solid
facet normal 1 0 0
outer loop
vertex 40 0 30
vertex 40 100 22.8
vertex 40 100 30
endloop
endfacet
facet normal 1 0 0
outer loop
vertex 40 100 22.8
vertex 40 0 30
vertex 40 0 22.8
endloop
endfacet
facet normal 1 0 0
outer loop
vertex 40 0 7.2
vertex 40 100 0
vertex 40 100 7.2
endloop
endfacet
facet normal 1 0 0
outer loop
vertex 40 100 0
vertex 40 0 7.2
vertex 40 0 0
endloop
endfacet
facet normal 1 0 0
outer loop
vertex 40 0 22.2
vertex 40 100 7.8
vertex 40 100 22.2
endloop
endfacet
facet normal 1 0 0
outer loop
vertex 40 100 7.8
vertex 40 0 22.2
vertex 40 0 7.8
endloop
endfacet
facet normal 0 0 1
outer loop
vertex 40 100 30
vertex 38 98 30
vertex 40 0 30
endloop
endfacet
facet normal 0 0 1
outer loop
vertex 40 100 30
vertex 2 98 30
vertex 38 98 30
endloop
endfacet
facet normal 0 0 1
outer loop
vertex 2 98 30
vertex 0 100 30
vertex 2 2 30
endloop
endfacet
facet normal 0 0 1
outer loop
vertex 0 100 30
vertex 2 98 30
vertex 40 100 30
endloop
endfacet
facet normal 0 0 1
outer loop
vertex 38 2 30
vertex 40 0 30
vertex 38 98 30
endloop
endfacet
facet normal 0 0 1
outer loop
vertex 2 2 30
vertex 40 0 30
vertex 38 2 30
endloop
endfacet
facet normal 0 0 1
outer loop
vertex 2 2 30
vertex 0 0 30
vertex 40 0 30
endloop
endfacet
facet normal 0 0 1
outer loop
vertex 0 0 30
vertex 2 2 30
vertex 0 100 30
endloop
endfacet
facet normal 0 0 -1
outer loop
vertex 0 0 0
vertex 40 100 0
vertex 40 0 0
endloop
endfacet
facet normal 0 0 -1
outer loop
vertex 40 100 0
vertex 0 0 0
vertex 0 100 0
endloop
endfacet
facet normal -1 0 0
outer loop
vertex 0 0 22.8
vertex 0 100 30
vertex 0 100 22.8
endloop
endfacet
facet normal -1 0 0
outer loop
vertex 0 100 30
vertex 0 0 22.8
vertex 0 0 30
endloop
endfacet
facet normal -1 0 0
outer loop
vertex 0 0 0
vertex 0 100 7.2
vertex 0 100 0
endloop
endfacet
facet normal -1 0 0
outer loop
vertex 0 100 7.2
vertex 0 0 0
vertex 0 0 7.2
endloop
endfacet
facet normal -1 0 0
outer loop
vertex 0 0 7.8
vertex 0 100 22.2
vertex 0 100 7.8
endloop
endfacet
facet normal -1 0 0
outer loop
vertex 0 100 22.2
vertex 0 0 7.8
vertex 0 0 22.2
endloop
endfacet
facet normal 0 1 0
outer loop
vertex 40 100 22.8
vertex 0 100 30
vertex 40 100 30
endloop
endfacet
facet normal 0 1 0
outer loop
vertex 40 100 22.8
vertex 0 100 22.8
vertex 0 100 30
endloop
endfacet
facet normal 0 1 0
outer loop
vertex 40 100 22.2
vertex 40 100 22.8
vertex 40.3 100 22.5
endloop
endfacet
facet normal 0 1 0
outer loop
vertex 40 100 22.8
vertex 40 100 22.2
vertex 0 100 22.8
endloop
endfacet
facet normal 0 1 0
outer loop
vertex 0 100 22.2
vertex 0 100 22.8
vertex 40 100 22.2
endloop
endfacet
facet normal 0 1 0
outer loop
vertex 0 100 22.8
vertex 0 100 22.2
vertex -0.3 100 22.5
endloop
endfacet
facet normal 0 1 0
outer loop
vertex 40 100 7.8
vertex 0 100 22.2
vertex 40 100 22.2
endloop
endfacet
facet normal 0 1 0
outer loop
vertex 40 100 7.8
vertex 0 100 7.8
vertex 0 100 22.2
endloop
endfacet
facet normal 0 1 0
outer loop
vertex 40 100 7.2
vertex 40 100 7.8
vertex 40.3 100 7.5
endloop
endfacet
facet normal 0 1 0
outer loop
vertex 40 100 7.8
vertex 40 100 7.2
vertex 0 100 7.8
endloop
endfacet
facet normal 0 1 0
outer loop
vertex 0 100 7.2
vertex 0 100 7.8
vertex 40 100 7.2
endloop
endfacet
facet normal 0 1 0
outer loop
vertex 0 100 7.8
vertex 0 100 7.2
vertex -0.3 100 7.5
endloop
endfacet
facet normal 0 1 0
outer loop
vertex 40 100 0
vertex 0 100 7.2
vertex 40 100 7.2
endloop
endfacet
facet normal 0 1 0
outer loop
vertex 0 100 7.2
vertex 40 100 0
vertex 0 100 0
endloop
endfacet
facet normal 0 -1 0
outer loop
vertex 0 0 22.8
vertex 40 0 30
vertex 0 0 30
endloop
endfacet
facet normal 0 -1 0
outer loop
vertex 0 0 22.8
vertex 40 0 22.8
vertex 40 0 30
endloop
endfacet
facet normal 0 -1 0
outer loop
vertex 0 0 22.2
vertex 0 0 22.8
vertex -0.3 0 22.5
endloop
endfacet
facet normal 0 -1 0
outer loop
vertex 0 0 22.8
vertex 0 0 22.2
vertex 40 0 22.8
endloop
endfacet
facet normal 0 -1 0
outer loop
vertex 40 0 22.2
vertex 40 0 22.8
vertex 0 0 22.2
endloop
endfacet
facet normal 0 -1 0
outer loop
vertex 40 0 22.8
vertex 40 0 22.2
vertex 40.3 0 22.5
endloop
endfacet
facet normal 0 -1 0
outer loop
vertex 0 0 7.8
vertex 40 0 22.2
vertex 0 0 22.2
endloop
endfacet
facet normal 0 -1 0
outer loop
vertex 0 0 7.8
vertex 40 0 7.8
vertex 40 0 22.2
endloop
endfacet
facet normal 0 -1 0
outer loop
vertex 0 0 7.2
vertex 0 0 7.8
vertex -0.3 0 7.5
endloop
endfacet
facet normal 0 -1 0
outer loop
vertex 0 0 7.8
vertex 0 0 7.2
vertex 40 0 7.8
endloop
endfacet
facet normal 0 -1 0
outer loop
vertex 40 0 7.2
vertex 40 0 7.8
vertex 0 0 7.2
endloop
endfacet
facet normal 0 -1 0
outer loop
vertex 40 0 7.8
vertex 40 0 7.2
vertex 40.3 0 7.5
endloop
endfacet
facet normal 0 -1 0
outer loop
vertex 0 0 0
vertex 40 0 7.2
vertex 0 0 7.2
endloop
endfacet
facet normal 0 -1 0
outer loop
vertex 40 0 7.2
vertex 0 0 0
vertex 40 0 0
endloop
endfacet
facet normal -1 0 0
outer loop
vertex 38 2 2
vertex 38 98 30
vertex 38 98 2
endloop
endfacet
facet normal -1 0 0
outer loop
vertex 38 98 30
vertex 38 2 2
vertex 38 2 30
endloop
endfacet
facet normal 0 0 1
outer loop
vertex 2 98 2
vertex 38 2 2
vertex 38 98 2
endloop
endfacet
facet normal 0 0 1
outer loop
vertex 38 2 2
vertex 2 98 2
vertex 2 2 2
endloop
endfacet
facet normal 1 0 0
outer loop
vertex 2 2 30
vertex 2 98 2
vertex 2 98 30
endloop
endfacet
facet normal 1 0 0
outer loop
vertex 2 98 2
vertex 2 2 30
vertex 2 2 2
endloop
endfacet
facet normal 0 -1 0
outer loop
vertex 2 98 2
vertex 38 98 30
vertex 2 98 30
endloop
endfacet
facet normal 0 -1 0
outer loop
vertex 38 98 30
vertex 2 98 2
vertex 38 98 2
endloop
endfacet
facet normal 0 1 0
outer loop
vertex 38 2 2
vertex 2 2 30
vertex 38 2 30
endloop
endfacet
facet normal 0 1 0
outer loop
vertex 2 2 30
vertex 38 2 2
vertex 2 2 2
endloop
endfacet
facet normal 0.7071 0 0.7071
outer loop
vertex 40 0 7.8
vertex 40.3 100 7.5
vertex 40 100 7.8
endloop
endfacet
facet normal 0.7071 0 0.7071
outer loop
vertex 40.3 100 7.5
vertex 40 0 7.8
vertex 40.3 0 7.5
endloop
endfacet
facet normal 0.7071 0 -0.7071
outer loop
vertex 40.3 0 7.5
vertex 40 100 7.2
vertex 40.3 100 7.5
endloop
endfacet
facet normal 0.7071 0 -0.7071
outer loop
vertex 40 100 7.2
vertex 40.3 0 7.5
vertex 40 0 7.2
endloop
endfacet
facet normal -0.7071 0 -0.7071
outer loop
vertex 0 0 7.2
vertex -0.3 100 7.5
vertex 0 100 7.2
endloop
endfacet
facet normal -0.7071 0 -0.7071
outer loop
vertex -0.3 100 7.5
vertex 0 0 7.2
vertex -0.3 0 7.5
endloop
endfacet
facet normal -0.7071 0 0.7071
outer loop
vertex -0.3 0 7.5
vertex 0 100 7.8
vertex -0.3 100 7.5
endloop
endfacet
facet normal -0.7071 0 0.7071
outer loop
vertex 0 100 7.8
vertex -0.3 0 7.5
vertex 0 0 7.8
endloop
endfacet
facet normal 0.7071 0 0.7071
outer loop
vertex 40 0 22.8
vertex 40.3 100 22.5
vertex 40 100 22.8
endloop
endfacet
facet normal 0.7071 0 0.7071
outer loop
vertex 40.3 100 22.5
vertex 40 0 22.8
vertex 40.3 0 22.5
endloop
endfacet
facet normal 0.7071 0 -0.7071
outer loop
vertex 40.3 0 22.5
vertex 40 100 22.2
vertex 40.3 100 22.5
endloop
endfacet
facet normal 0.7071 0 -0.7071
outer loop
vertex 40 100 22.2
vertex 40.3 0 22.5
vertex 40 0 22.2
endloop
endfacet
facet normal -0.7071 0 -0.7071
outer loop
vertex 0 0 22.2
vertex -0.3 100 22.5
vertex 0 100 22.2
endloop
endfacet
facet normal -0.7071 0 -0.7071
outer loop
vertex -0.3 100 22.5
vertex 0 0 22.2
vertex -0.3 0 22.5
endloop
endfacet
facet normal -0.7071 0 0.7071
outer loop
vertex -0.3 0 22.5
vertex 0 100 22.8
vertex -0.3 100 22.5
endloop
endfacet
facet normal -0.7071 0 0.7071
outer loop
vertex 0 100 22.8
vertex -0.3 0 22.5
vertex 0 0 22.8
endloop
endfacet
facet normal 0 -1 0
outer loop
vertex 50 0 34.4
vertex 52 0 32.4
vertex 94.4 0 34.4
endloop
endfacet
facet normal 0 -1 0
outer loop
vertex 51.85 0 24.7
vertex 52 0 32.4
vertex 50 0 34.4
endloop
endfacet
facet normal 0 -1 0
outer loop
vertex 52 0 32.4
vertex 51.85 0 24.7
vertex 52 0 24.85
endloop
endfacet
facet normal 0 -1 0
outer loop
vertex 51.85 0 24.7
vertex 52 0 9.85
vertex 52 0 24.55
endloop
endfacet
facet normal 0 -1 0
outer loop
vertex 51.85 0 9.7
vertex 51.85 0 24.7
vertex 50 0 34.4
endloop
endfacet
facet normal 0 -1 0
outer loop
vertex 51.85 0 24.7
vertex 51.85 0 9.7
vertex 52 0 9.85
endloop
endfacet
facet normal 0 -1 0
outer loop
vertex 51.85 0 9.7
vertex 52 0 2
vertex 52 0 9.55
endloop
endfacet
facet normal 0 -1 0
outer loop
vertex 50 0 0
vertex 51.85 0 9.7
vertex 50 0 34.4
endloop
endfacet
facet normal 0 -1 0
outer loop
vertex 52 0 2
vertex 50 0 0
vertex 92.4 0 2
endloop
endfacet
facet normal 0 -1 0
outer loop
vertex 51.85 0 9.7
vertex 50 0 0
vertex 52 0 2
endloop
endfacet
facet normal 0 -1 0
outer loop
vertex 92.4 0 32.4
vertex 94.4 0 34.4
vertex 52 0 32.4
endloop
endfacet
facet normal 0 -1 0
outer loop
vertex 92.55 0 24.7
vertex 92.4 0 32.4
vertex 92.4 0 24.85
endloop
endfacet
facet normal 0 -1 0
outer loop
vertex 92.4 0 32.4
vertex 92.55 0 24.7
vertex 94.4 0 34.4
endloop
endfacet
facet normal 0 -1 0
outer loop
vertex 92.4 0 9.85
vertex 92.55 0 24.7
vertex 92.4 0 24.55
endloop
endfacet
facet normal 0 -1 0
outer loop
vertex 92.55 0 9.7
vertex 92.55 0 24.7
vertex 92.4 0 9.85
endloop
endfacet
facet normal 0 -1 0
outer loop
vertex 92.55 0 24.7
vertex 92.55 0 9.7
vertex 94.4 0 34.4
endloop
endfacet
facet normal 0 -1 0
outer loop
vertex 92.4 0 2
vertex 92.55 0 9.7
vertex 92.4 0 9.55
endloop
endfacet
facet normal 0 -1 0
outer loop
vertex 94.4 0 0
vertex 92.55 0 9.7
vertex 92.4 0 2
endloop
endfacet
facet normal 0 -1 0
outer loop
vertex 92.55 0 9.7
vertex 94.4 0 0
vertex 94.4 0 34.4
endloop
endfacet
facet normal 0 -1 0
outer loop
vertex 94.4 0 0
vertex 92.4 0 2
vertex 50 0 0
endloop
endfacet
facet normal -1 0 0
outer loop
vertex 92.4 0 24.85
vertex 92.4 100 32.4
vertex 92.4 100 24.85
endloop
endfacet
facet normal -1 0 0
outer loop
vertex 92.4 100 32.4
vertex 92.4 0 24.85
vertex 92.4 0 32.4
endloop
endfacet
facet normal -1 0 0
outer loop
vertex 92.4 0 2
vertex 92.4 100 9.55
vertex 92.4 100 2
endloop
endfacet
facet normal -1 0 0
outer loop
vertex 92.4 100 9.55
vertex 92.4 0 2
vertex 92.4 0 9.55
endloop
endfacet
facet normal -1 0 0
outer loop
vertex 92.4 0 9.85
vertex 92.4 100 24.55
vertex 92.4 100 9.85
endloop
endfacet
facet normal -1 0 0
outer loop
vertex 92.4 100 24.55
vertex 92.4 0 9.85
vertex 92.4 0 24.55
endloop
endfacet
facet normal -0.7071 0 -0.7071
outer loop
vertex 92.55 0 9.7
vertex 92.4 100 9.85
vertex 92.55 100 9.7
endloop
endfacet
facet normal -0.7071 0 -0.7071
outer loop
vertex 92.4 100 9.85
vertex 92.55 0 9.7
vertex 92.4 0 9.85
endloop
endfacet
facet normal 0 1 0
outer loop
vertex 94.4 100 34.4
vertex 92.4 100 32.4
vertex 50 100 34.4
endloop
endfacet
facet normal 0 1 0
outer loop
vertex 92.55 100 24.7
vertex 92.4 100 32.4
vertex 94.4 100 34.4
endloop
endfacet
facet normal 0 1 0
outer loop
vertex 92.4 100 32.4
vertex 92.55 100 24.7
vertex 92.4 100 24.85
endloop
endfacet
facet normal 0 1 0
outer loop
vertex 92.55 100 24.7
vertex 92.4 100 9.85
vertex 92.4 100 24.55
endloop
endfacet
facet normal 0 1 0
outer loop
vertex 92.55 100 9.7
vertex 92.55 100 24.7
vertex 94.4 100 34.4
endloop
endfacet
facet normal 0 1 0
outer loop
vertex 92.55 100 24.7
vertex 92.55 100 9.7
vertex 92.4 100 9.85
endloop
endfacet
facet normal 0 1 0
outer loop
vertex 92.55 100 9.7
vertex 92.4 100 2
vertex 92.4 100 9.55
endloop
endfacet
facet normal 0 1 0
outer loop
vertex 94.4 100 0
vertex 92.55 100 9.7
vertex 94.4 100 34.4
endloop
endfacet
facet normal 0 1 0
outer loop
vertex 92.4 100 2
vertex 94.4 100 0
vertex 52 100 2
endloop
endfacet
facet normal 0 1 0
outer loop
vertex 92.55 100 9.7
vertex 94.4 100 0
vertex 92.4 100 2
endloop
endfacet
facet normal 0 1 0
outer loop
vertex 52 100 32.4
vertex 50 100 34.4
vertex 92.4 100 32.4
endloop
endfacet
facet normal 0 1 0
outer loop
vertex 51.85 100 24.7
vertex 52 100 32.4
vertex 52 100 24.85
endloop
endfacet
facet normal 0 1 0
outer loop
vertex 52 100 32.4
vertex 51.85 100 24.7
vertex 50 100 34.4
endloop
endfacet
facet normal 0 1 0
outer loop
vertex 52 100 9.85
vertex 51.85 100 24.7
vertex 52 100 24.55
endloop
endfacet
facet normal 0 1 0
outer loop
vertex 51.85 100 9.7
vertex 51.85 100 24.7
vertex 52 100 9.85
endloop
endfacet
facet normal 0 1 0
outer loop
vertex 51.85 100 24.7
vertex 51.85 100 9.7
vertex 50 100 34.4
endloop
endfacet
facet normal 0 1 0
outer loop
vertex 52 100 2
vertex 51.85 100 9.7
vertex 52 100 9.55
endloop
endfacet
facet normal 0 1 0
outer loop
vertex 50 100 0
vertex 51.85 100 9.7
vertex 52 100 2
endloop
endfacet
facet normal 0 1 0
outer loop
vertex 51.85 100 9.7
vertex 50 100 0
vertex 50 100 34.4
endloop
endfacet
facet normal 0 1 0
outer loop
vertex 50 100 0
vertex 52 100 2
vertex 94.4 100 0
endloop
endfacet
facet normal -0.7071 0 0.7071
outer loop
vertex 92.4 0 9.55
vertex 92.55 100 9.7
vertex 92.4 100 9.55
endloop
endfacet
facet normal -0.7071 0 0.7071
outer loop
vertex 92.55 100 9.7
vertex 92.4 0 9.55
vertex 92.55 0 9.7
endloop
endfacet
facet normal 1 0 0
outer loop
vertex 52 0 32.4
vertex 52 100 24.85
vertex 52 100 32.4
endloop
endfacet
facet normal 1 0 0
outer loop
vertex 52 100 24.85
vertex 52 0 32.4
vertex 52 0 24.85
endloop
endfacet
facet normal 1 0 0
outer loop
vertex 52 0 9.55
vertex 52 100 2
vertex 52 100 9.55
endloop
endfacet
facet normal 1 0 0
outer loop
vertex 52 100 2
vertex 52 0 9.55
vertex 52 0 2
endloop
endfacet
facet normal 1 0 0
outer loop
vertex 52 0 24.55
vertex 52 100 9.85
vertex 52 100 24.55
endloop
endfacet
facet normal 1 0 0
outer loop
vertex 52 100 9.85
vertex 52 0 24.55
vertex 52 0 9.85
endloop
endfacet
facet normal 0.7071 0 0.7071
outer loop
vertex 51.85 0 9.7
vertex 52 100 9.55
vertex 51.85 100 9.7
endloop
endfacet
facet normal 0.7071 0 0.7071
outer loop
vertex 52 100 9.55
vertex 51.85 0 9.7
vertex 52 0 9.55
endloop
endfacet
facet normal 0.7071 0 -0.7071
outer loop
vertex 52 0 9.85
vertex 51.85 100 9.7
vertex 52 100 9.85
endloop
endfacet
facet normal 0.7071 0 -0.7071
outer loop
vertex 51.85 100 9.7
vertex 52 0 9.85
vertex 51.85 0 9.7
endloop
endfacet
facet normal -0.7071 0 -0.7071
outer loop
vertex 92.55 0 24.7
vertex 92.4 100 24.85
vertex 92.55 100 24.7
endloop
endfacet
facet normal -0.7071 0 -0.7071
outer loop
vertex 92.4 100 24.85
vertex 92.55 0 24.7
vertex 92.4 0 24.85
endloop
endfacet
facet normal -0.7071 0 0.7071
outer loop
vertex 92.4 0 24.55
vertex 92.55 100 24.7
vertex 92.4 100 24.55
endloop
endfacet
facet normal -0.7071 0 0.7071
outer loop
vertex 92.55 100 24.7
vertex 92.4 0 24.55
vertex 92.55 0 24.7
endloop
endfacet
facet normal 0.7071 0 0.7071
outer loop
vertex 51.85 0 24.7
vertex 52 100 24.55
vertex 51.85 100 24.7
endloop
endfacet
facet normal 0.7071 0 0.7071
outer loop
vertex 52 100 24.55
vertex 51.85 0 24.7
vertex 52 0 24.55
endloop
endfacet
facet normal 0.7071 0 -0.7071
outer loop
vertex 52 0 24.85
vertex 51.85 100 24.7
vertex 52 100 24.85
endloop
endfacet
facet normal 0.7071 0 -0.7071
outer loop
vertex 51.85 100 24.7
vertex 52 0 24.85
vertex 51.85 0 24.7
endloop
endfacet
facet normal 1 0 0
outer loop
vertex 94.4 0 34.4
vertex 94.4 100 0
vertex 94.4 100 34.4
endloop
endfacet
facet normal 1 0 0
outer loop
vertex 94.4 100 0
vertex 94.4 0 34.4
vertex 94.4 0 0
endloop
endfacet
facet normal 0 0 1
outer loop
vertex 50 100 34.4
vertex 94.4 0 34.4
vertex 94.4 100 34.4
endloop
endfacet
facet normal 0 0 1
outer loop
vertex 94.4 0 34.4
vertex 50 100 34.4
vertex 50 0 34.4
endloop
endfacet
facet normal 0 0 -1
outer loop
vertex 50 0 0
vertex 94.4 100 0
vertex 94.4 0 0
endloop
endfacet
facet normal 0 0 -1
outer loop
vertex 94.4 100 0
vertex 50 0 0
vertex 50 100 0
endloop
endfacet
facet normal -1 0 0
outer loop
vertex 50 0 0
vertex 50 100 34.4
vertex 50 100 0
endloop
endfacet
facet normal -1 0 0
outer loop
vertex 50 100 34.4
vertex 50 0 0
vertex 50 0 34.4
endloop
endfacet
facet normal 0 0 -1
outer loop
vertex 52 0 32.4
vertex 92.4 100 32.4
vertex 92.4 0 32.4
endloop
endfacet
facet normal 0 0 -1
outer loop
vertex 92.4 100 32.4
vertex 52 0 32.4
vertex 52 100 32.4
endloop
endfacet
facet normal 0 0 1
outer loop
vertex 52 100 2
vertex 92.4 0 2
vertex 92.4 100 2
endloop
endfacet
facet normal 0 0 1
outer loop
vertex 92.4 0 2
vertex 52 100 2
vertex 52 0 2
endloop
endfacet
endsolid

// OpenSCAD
width  = 40;
depth  = 100;
height = 30;
wall   = 2;

clearance          = 0.2;
ridge_interference = 0.1;
groove_clearance   = 0.05;

ridge_protrusion  = clearance + ridge_interference;
groove_protrusion = ridge_interference + groove_clearance;

module ridge(p) {
    rotate([-90, 0, 0])
        linear_extrude(depth)
            polygon([
                [0, -p],
                [0,  p],
                [p, 0]
            ]);
}

module inner_box() {
    difference() {
        cube([width, depth, height]);
        translate([wall, wall, wall])
            cube([width - 2 * wall, depth - 2 * wall, height]);
    }
    for (z = [height / 4, 3 * height / 4]) {
        translate([width, 0, z]) ridge(ridge_protrusion);
        translate([0, 0, z]) mirror([1, 0, 0]) ridge(ridge_protrusion);
    }
}

module sleeve() {
    sw = width  + 2 * (clearance + wall);
    sh = height + 2 * (clearance + wall);
    difference() {
        cube([sw, depth, sh]);
        translate([wall, 0, wall])
            cube([width + 2 * clearance, depth, height + 2 * clearance]);
        for (z = [wall + clearance + height / 4, wall + clearance + 3 * height / 4]) {
            translate([wall + width + 2 * clearance, 0, z])
                ridge(groove_protrusion);
            translate([wall, 0, z])
                mirror([1, 0, 0]) ridge(groove_protrusion);
        }
    }
}

inner_box();
translate([width + 10, 0, 0]) sleeve();
